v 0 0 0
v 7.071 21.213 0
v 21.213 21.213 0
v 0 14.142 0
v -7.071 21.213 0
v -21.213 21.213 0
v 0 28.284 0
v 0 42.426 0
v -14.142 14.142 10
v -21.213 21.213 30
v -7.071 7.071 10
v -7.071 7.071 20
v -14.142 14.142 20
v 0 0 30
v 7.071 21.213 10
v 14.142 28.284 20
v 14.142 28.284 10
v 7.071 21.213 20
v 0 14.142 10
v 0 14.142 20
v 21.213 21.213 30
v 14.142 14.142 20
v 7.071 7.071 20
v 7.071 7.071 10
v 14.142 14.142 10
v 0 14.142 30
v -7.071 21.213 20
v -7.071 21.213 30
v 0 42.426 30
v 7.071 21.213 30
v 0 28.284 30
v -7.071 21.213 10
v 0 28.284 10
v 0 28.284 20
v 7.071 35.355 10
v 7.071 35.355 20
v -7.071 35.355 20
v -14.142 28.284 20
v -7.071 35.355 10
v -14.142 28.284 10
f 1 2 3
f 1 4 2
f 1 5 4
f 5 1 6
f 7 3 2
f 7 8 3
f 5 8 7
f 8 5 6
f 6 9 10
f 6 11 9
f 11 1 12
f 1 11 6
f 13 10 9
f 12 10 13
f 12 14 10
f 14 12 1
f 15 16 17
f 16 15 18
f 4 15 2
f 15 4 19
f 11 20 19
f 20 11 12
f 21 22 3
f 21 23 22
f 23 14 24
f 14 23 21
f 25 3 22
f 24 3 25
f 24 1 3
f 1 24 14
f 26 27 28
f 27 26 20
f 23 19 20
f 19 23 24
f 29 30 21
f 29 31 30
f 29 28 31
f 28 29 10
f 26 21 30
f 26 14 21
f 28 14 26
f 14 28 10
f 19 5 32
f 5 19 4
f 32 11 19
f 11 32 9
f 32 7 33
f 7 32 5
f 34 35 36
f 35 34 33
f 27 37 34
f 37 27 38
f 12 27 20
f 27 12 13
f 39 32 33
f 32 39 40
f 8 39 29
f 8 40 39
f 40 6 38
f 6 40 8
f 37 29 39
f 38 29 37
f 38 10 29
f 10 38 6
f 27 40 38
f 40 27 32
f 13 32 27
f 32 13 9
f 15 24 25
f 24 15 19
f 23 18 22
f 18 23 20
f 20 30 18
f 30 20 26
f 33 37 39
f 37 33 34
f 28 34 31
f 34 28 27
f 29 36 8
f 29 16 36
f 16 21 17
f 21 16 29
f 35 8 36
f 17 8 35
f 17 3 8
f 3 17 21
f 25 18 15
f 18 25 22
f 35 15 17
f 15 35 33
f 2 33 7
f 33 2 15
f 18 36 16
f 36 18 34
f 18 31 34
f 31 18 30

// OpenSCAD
rotate(a=[0, 0, 45]){
    color("black"){
        union(){
            translate(v=[0.0, 0.0, 0.0]){
                cube(size=[10.0, 10.0, 10.0]);
            };
            translate(v=[0.0, 0.0, 10.0]){
                cube(size=[10.0, 10.0, 10.0]);
            };
            translate(v=[0.0, 0.0, 20.0]){
                cube(size=[10.0, 10.0, 10.0]);
            };
            translate(v=[0.0, 10.0, 0.0]){
                cube(size=[10.0, 10.0, 10.0]);
            };
            translate(v=[0.0, 10.0, 20.0]){
                cube(size=[10.0, 10.0, 10.0]);
            };
            translate(v=[0.0, 20.0, 0.0]){
                cube(size=[10.0, 10.0, 10.0]);
            };
            translate(v=[0.0, 20.0, 10.0]){
                cube(size=[10.0, 10.0, 10.0]);
            };
            translate(v=[0.0, 20.0, 20.0]){
                cube(size=[10.0, 10.0, 10.0]);
            };
            translate(v=[10.0, 0.0, 0.0]){
                cube(size=[10.0, 10.0, 10.0]);
            };
            translate(v=[10.0, 0.0, 20.0]){
                cube(size=[10.0, 10.0, 10.0]);
            };
            translate(v=[10.0, 20.0, 0.0]){
                cube(size=[10.0, 10.0, 10.0]);
            };
            translate(v=[10.0, 20.0, 20.0]){
                cube(size=[10.0, 10.0, 10.0]);
            };
            translate(v=[20.0, 0.0, 0.0]){
                cube(size=[10.0, 10.0, 10.0]);
            };
            translate(v=[20.0, 0.0, 10.0]){
                cube(size=[10.0, 10.0, 10.0]);
            };
            translate(v=[20.0, 0.0, 20.0]){
                cube(size=[10.0, 10.0, 10.0]);
            };
            translate(v=[20.0, 10.0, 0.0]){
                cube(size=[10.0, 10.0, 10.0]);
            };
            translate(v=[20.0, 10.0, 20.0]){
                cube(size=[10.0, 10.0, 10.0]);
            };
            translate(v=[20.0, 20.0, 0.0]){
                cube(size=[10.0, 10.0, 10.0]);
            };
            translate(v=[20.0, 20.0, 10.0]){
                cube(size=[10.0, 10.0, 10.0]);
            };
            translate(v=[20.0, 20.0, 20.0]){
                cube(size=[10.0, 10.0, 10.0]);
            };
        };
    };
};
